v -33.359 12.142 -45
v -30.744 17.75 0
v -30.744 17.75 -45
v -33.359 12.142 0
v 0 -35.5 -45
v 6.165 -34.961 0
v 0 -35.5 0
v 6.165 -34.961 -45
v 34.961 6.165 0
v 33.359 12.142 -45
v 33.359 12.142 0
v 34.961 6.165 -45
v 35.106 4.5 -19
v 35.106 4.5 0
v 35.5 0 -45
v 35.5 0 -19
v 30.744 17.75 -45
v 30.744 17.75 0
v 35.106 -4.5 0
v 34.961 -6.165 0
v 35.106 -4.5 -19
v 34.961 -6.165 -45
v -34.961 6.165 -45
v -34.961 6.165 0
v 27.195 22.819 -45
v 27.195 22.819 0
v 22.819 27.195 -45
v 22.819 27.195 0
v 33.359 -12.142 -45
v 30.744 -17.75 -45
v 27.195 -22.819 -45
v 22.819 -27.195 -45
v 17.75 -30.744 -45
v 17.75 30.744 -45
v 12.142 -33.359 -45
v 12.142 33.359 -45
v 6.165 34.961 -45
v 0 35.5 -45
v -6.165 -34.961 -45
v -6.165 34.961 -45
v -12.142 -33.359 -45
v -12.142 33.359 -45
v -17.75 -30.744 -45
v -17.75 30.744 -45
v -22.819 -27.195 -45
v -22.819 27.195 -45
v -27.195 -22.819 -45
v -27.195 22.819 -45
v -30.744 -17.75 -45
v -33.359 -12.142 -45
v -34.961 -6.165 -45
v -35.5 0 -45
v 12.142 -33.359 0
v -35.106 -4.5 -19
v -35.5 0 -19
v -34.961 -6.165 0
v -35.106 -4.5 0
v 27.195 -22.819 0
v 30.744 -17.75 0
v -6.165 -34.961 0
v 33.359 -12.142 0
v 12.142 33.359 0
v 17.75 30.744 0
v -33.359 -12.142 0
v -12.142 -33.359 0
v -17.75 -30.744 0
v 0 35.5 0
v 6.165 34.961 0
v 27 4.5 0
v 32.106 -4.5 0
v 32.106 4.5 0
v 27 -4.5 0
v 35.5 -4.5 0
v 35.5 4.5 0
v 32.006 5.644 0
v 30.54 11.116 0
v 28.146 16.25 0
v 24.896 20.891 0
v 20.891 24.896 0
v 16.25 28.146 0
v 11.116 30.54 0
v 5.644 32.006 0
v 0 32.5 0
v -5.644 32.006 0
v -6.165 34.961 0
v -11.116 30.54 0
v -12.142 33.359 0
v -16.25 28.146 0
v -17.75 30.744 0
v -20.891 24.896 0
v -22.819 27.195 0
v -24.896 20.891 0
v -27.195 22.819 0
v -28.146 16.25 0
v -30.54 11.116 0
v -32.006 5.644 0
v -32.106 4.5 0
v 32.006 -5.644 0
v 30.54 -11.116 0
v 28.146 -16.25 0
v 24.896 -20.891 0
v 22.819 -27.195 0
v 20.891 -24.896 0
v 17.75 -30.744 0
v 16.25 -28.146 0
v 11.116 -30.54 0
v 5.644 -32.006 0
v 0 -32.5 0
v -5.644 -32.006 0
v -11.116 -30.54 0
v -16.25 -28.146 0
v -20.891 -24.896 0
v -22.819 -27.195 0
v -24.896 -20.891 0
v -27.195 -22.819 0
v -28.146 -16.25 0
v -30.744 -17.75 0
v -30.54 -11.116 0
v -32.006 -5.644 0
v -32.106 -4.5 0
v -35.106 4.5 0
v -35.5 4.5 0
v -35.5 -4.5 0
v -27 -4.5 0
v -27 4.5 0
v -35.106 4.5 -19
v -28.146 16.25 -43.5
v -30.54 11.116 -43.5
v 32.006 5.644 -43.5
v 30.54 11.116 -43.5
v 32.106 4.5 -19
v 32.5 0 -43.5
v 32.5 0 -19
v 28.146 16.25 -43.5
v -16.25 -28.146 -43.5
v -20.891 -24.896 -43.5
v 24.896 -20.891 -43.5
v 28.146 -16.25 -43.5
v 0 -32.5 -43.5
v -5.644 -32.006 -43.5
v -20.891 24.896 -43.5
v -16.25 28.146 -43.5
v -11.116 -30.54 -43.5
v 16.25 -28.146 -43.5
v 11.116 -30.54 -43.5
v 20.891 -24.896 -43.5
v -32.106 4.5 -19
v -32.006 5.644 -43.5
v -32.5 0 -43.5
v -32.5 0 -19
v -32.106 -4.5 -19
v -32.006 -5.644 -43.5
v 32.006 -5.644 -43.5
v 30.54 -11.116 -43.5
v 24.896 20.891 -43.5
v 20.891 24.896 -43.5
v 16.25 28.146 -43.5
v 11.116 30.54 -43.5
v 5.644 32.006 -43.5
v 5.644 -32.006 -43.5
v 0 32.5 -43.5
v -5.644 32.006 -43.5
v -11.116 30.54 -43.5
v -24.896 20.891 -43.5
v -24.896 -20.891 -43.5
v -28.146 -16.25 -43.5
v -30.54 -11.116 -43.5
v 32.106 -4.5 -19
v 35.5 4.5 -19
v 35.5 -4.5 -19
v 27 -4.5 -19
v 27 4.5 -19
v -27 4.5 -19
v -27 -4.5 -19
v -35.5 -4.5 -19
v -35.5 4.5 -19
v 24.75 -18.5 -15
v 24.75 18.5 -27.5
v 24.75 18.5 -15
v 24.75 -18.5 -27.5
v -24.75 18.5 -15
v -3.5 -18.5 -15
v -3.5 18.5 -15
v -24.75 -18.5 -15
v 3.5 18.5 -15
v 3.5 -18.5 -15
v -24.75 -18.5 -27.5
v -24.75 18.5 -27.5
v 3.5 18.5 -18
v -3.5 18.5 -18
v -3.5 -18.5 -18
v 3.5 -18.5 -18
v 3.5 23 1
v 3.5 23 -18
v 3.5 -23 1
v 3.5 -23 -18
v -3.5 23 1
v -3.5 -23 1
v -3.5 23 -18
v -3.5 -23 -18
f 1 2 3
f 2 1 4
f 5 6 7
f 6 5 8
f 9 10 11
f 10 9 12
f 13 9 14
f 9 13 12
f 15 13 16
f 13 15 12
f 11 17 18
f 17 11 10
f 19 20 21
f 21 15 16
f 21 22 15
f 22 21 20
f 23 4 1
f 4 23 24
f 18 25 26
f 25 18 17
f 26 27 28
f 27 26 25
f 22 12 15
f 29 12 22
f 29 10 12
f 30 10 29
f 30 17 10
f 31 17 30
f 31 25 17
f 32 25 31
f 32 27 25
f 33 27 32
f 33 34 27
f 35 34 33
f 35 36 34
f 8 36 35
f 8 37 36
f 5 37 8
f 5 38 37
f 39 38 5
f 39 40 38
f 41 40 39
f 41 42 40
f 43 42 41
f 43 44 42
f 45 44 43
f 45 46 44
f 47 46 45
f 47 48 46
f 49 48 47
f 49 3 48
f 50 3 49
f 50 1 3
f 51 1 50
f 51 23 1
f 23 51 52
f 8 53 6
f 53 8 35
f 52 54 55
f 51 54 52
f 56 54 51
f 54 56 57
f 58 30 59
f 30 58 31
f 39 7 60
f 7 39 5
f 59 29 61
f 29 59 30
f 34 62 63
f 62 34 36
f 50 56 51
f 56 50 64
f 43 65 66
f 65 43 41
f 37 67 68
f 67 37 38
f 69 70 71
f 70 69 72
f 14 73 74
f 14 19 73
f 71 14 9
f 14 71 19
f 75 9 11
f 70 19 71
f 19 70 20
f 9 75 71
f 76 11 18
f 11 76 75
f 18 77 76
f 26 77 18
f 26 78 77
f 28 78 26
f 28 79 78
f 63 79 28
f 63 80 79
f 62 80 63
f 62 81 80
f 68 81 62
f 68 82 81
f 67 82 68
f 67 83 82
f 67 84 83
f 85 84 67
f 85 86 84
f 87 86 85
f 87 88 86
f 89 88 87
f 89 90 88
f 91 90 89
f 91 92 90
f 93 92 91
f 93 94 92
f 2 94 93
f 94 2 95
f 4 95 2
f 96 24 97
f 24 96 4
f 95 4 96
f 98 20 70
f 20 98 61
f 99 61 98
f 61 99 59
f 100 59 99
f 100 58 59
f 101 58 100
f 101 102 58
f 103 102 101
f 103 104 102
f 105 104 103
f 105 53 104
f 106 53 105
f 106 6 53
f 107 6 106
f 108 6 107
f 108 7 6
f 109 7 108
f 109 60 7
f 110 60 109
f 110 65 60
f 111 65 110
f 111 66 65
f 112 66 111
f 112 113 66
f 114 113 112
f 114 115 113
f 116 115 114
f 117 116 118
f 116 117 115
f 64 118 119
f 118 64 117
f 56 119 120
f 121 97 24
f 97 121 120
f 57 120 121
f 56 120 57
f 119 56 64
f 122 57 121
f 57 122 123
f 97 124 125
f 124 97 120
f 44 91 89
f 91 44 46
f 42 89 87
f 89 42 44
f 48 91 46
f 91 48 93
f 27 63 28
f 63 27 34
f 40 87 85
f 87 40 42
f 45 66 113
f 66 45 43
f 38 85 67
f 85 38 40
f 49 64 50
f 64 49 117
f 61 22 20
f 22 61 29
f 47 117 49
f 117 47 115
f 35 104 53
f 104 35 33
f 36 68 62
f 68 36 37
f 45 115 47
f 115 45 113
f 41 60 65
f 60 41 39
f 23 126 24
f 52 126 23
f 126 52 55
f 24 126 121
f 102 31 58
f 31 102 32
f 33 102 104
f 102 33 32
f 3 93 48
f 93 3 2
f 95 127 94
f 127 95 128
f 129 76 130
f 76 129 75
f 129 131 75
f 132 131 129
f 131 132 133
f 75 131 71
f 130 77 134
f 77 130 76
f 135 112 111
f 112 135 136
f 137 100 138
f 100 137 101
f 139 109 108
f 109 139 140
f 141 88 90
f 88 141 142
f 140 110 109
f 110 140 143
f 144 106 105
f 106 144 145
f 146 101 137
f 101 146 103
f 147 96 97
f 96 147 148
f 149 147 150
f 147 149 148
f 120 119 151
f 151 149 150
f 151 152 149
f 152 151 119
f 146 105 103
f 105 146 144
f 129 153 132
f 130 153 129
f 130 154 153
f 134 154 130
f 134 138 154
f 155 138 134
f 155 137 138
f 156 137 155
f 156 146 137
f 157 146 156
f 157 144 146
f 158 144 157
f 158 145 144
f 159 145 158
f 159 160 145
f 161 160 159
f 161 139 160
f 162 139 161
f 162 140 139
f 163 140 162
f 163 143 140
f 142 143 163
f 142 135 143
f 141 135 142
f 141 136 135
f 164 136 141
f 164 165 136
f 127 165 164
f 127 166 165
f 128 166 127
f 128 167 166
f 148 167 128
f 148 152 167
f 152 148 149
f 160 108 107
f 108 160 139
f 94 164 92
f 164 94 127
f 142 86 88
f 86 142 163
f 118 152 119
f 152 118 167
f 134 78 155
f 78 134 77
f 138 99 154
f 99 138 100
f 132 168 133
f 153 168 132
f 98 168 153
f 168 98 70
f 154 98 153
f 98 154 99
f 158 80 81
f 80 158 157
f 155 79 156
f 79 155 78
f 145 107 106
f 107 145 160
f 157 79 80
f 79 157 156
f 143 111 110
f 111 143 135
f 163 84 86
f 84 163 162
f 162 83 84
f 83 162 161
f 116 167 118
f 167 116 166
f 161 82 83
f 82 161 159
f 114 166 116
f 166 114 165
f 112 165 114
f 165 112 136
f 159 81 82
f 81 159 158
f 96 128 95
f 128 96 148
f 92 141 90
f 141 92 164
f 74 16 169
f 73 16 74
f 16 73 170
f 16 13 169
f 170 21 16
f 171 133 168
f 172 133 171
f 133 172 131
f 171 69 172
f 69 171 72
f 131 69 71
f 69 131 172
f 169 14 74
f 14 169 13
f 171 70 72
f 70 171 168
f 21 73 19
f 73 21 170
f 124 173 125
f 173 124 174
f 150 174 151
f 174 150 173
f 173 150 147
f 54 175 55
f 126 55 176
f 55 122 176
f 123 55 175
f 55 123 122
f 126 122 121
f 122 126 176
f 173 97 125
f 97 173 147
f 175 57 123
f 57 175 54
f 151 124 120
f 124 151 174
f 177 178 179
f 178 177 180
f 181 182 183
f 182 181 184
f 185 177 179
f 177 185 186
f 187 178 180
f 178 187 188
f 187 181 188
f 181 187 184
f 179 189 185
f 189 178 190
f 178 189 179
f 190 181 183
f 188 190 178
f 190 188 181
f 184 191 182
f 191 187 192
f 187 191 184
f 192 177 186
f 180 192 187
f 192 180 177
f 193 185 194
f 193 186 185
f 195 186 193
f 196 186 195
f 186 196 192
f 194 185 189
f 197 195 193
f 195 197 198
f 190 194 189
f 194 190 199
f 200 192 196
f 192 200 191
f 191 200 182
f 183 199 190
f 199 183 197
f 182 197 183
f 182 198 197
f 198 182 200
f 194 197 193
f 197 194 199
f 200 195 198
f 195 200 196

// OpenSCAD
module box() {
	box_h = 45;
	box_r = 71/2;
	box_r_in = 65/2;
	difference() {
		translate([0, 0, -box_h]) {
			cylinder(h=box_h, r=box_r, $fa=10);
		}

		// Bottom is 1.5mm thick
		translate([0, 0, 1.5-box_h]) {
			cylinder(h=box_h, r=box_r_in, $fa=10);
		}
	}

	cube_dist = 54; // Distance between the two cubes
	cube_h = 19;
	cube_w = box_r - cube_dist/2;
	cube_l = 9;

	translate([(cube_dist+cube_w)/2, 0, -cube_h/2]) {
		cube([cube_w, cube_l, cube_h], center=true);
	}
	translate([-(cube_dist+cube_w)/2, 0, -cube_h/2]) {
		cube([cube_w, cube_l, cube_h], center=true);
	}

}

module socket() {
	plate_h = 1;
	socket_w = 49.5;
	socket_whole_h = 28.5; // Including plate
	socket_h = 12.5;
	socket_l = 37;
	ground_h = 19; // Including plate
	ground_w = 7;
	ground_l = 46;

	translate([0, 0, -socket_h/2 -(socket_whole_h-socket_h-plate_h)]) {
		cube([socket_w, socket_l, socket_h], center=true);
	}
//	echo(socket_whole_h-socket_h-plate_h);


	translate([0, 0, -ground_h/2 -(-plate_h)]) {
		cube([ground_w, ground_l, ground_h], center=true);
	}

	
	
}

box();

socket();
